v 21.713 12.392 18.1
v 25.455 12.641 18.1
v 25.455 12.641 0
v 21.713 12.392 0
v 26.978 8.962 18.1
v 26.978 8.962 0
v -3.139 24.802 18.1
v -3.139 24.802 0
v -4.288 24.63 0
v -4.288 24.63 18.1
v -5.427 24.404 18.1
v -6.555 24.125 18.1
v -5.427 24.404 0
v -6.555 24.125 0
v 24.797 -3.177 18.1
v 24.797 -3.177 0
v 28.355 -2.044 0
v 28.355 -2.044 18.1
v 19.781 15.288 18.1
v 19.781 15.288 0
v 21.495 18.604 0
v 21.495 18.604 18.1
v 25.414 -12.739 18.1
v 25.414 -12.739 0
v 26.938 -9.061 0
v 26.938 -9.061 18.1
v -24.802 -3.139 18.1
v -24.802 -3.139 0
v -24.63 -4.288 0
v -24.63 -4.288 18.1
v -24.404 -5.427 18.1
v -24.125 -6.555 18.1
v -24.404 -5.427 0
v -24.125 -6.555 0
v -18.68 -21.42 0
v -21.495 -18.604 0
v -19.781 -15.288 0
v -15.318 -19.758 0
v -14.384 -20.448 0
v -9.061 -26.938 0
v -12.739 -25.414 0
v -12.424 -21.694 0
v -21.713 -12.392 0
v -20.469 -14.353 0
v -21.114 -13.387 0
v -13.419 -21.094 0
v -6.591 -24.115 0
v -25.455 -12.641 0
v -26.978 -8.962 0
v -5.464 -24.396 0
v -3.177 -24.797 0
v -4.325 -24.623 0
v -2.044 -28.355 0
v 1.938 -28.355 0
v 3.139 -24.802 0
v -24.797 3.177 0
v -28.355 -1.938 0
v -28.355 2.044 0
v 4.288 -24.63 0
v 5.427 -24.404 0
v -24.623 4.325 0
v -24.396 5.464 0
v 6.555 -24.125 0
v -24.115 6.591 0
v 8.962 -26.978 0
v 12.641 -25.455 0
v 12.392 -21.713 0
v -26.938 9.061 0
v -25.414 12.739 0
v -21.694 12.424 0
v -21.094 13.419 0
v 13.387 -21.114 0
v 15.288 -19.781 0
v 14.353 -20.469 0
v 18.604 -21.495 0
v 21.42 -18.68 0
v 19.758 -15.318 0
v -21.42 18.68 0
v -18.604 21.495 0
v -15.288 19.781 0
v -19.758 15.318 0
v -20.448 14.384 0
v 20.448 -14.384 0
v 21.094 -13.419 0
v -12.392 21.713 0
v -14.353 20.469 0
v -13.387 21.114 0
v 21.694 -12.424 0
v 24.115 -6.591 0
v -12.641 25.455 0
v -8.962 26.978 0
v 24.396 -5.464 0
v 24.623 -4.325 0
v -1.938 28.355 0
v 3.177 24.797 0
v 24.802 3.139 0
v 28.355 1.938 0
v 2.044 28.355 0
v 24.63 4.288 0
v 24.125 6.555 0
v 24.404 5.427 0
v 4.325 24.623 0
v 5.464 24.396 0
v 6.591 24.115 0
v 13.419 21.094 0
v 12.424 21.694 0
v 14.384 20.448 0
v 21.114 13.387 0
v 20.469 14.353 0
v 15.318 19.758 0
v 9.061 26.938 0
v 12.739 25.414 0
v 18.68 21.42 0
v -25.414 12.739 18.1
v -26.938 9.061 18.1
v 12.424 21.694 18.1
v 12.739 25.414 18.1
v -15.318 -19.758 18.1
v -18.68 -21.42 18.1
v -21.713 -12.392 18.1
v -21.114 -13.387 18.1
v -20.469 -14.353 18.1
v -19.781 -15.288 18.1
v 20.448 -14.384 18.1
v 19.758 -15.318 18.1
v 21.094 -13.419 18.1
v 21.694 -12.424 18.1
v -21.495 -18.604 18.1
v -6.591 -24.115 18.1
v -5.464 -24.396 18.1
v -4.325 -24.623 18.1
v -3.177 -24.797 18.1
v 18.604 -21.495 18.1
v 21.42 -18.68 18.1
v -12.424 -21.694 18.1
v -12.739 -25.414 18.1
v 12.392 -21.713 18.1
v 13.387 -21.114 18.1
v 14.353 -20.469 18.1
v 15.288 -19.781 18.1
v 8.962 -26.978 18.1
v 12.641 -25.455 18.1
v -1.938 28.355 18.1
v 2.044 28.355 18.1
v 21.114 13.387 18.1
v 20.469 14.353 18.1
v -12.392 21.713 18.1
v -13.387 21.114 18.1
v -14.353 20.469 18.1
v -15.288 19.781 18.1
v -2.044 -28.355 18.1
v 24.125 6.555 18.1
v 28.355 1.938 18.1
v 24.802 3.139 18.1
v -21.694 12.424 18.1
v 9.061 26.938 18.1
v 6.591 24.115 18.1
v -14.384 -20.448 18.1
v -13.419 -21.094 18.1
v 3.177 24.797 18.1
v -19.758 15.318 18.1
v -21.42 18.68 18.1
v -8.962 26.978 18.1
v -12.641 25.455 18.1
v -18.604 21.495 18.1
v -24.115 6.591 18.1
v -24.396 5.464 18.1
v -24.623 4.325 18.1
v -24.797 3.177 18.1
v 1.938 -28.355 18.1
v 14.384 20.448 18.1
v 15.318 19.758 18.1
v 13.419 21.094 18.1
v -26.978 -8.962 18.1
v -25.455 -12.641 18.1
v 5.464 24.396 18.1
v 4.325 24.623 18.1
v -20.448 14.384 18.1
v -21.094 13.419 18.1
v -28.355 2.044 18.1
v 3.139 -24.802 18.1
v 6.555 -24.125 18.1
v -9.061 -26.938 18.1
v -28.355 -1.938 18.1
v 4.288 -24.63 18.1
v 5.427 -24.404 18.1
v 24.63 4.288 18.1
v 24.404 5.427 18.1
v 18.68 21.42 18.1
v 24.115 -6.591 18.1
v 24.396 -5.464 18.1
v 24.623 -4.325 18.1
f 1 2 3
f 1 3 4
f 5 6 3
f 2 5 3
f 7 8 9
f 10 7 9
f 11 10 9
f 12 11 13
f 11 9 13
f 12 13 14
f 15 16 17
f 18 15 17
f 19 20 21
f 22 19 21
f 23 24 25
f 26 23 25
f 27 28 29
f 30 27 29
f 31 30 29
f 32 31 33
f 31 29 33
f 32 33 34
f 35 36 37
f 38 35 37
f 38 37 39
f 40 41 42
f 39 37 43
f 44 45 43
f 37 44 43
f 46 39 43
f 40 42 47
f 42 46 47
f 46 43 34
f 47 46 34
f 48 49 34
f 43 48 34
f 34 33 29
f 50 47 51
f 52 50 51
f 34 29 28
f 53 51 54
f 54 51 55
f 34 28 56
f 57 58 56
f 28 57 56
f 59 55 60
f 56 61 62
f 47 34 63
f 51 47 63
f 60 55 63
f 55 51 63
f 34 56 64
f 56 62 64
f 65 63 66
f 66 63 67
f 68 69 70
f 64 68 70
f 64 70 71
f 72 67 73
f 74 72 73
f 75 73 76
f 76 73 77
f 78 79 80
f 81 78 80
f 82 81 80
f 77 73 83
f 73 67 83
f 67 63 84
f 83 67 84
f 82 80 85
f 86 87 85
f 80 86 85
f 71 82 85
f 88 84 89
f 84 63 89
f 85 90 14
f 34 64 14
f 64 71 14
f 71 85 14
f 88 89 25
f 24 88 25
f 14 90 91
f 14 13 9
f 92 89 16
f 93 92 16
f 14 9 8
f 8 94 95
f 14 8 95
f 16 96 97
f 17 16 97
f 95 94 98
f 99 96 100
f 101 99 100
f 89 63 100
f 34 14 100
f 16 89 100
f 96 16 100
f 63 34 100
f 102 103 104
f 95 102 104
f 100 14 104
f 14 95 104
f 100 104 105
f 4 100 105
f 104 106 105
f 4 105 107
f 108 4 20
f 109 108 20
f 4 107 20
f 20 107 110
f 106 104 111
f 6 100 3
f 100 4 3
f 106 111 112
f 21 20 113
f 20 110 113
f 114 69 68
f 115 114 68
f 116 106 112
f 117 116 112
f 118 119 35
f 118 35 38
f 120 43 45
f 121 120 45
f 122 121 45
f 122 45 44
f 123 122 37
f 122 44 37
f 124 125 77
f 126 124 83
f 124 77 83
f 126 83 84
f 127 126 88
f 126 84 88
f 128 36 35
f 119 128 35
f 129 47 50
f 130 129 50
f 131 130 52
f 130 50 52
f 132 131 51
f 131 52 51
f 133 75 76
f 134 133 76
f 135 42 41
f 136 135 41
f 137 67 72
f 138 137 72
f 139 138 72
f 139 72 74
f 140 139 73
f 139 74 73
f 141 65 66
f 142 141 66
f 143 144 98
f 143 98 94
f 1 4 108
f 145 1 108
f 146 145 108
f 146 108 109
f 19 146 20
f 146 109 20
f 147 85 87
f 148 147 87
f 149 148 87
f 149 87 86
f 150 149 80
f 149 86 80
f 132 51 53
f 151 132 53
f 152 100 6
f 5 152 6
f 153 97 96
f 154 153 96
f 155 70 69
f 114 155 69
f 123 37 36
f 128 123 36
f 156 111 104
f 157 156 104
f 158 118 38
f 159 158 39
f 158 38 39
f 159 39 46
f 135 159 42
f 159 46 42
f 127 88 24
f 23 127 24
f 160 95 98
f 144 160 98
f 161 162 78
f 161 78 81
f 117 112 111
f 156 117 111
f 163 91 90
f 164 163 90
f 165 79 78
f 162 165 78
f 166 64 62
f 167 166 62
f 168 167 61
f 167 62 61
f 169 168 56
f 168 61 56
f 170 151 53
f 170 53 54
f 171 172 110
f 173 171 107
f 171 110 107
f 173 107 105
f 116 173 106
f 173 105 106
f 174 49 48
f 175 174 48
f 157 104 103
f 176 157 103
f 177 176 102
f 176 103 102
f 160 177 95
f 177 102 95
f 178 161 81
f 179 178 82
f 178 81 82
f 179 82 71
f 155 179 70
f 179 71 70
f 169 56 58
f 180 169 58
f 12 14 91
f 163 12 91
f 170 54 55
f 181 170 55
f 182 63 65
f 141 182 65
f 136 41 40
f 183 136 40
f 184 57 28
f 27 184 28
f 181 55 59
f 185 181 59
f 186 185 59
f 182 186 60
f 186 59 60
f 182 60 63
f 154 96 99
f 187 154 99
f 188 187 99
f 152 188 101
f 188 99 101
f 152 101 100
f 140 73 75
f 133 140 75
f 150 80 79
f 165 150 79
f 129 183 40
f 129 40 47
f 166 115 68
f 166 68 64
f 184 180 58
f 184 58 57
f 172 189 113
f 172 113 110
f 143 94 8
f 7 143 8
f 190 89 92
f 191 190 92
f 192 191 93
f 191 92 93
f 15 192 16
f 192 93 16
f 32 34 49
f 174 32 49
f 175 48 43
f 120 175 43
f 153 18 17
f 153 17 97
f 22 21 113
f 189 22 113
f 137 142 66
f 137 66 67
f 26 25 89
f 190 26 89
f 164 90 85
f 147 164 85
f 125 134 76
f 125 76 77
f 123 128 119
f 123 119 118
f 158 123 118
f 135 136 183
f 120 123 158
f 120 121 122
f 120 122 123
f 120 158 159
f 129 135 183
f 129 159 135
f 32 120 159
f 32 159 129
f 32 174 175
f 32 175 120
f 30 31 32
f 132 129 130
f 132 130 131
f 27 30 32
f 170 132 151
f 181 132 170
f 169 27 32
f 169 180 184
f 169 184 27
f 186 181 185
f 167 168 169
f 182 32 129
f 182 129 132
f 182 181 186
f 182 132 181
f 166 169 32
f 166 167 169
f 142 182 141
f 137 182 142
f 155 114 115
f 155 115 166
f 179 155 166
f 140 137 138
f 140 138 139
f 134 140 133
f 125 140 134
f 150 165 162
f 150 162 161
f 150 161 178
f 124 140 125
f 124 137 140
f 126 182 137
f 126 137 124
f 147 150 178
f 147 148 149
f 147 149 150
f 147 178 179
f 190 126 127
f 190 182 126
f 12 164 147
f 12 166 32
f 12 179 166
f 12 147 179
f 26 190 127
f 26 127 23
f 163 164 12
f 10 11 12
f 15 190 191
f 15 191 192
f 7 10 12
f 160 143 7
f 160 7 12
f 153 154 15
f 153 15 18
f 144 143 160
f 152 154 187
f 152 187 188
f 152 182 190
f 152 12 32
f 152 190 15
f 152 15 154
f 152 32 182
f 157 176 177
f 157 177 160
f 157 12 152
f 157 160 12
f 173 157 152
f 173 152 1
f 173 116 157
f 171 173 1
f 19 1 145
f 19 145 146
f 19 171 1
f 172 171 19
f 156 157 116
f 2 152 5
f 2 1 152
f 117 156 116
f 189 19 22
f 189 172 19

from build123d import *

# Parameters (mm, degrees)
F1_DEPTH = 18.1


with BuildPart() as f1:
    # F0 (on Top) → F1 (new body)
    with BuildSketch(Plane.XY):
        with BuildLine():
            ThreePointArc((24.797365, -3.176582), (24.94929, -1.591519), (25, 0))
            ThreePointArc((25, 0), (24.950482, 1.57272), (24.802124, 3.13921))
            ThreePointArc((24.802124, 3.13921), (24.5233, 4.858782), (24.125403, 6.554762))
            ThreePointArc((24.125403, 6.554762), (23.10419, 9.54968), (21.712851, 12.391614))
            ThreePointArc((21.712851, 12.391614), (20.7972, 13.87359), (19.780568, 15.288203))
            ThreePointArc((19.780568, 15.288203), (17.690984, 17.664345), (15.317994, 19.757507))
            ThreePointArc((15.317994, 19.757507), (13.904914, 20.776269), (12.42432, 21.694153))
            ThreePointArc((12.42432, 21.694153), (9.584486, 23.089773), (6.59111, 24.115498))
            ThreePointArc((6.59111, 24.115498), (4.895732, 24.51595), (3.176582, 24.797365))
            ThreePointArc((3.176582, 24.797365), (0.018837, 24.999993), (-3.13921, 24.802124))
            ThreePointArc((-3.13921, 24.802124), (-4.858782, 24.5233), (-6.554762, 24.125403))
            ThreePointArc((-6.554762, 24.125403), (-9.54968, 23.10419), (-12.391614, 21.712851))
            ThreePointArc((-12.391614, 21.712851), (-13.87359, 20.7972), (-15.288203, 19.780568))
            ThreePointArc((-15.288203, 19.780568), (-17.664345, 17.690984), (-19.757507, 15.317994))
            ThreePointArc((-19.757507, 15.317994), (-20.776269, 13.904914), (-21.694153, 12.42432))
            ThreePointArc((-21.694153, 12.42432), (-23.089773, 9.584486), (-24.115498, 6.59111))
            ThreePointArc((-24.115498, 6.59111), (-24.51595, 4.895732), (-24.797365, 3.176582))
            ThreePointArc((-24.797365, 3.176582), (-24.999993, 0.018837), (-24.802124, -3.13921))
            ThreePointArc((-24.802124, -3.13921), (-24.5233, -4.858782), (-24.125403, -6.554762))
            ThreePointArc((-24.125403, -6.554762), (-23.10419, -9.54968), (-21.712851, -12.391614))
            ThreePointArc((-21.712851, -12.391614), (-20.7972, -13.87359), (-19.780568, -15.288203))
            ThreePointArc((-19.780568, -15.288203), (-17.690984, -17.664345), (-15.317994, -19.757507))
            ThreePointArc((-15.317994, -19.757507), (-13.904914, -20.776269), (-12.42432, -21.694153))
            ThreePointArc((-12.42432, -21.694153), (-9.584486, -23.089773), (-6.59111, -24.115498))
            ThreePointArc((-6.59111, -24.115498), (-4.895732, -24.51595), (-3.176582, -24.797365))
            ThreePointArc((-3.176582, -24.797365), (-0.018837, -24.999993), (3.13921, -24.802124))
            ThreePointArc((3.13921, -24.802124), (4.858782, -24.5233), (6.554762, -24.125403))
            ThreePointArc((6.554762, -24.125403), (9.54968, -23.10419), (12.391614, -21.712851))
            ThreePointArc((12.391614, -21.712851), (13.87359, -20.7972), (15.288203, -19.780568))
            ThreePointArc((15.288203, -19.780568), (17.664345, -17.690984), (19.757507, -15.317994))
            ThreePointArc((19.757507, -15.317994), (20.776269, -13.904914), (21.694153, -12.42432))
            ThreePointArc((21.694153, -12.42432), (23.089773, -9.584486), (24.115498, -6.59111))
            ThreePointArc((24.115498, -6.59111), (24.51595, -4.895732), (24.797365, -3.176582))
        make_face()
        with BuildLine():
            ThreePointArc((24.802124, 3.13921), (24.950482, 1.57272), (25, 0))
            ThreePointArc((25, 0), (24.94929, -1.591519), (24.797365, -3.176582))
            Line((24.797365, -3.176582), (28.354543, -2.044125))
            Line((28.354543, -2.044125), (28.354543, 1.937519))
            Line((28.354543, 1.937519), (24.802124, 3.13921))
        make_face()
        with BuildLine():
            ThreePointArc((21.712851, 12.391614), (23.10419, 9.54968), (24.125403, 6.554762))
            Line((24.125403, 6.554762), (26.978435, 8.962289))
            Line((26.978435, 8.962289), (25.454726, 12.640848))
            Line((25.454726, 12.640848), (21.712851, 12.391614))
        make_face()
        with BuildLine():
            Line((26.937638, -9.06078), (24.115498, -6.59111))
            ThreePointArc((24.115498, -6.59111), (23.089773, -9.584486), (21.694153, -12.42432))
            Line((21.694153, -12.42432), (25.413929, -12.739339))
            Line((25.413929, -12.739339), (26.937638, -9.06078))
        make_face()
        with BuildLine():
            ThreePointArc((15.317994, 19.757507), (17.690984, 17.664345), (19.780568, 15.288203))
            Line((19.780568, 15.288203), (21.495104, 18.604275))
            Line((21.495104, 18.604275), (18.679657, 21.419722))
            Line((18.679657, 21.419722), (15.317994, 19.757507))
        make_face()
        with BuildLine():
            Line((21.419722, -18.679657), (19.757507, -15.317994))
            ThreePointArc((19.757507, -15.317994), (17.664345, -17.690984), (15.288203, -19.780568))
            Line((15.288203, -19.780568), (18.604275, -21.495104))
            Line((18.604275, -21.495104), (21.419722, -18.679657))
        make_face()
        with BuildLine():
            ThreePointArc((6.59111, 24.115498), (9.584486, 23.089773), (12.42432, 21.694153))
            Line((12.42432, 21.694153), (12.739339, 25.413929))
            Line((12.739339, 25.413929), (9.06078, 26.937638))
            Line((9.06078, 26.937638), (6.59111, 24.115498))
        make_face()
        with BuildLine():
            Line((12.640848, -25.454726), (12.391614, -21.712851))
            ThreePointArc((12.391614, -21.712851), (9.54968, -23.10419), (6.554762, -24.125403))
            Line((6.554762, -24.125403), (8.962289, -26.978435))
            Line((8.962289, -26.978435), (12.640848, -25.454726))
        make_face()
        with BuildLine():
            ThreePointArc((-3.13921, 24.802124), (0.018837, 24.999993), (3.176582, 24.797365))
            Line((3.176582, 24.797365), (2.044125, 28.354543))
            Line((2.044125, 28.354543), (-1.937519, 28.354543))
            Line((-1.937519, 28.354543), (-3.13921, 24.802124))
        make_face()
        with BuildLine():
            Line((1.937519, -28.354543), (3.13921, -24.802124))
            ThreePointArc((3.13921, -24.802124), (-0.018837, -24.999993), (-3.176582, -24.797365))
            Line((-3.176582, -24.797365), (-2.044125, -28.354543))
            Line((-2.044125, -28.354543), (1.937519, -28.354543))
        make_face()
        with BuildLine():
            ThreePointArc((-12.391614, 21.712851), (-9.54968, 23.10419), (-6.554762, 24.125403))
            Line((-6.554762, 24.125403), (-8.962289, 26.978435))
            Line((-8.962289, 26.978435), (-12.640848, 25.454726))
            Line((-12.640848, 25.454726), (-12.391614, 21.712851))
        make_face()
        with BuildLine():
            Line((-9.06078, -26.937638), (-6.59111, -24.115498))
            ThreePointArc((-6.59111, -24.115498), (-9.584486, -23.089773), (-12.42432, -21.694153))
            Line((-12.42432, -21.694153), (-12.739339, -25.413929))
            Line((-12.739339, -25.413929), (-9.06078, -26.937638))
        make_face()
        with BuildLine():
            ThreePointArc((-19.757507, 15.317994), (-17.664345, 17.690984), (-15.288203, 19.780568))
            Line((-15.288203, 19.780568), (-18.604275, 21.495104))
            Line((-18.604275, 21.495104), (-21.419722, 18.679657))
            Line((-21.419722, 18.679657), (-19.757507, 15.317994))
        make_face()
        with BuildLine():
            Line((-18.679657, -21.419722), (-15.317994, -19.757507))
            ThreePointArc((-15.317994, -19.757507), (-17.690984, -17.664345), (-19.780568, -15.288203))
            Line((-19.780568, -15.288203), (-21.495104, -18.604275))
            Line((-21.495104, -18.604275), (-18.679657, -21.419722))
        make_face()
        with BuildLine():
            ThreePointArc((-24.115498, 6.59111), (-23.089773, 9.584486), (-21.694153, 12.42432))
            Line((-21.694153, 12.42432), (-25.413929, 12.739339))
            Line((-25.413929, 12.739339), (-26.937638, 9.06078))
            Line((-26.937638, 9.06078), (-24.115498, 6.59111))
        make_face()
        with BuildLine():
            Line((-25.454726, -12.640848), (-21.712851, -12.391614))
            ThreePointArc((-21.712851, -12.391614), (-23.10419, -9.54968), (-24.125403, -6.554762))
            Line((-24.125403, -6.554762), (-26.978435, -8.962289))
            Line((-26.978435, -8.962289), (-25.454726, -12.640848))
        make_face()
        with BuildLine():
            ThreePointArc((-24.802124, -3.13921), (-24.999993, 0.018837), (-24.797365, 3.176582))
            Line((-24.797365, 3.176582), (-28.354543, 2.044125))
            Line((-28.354543, 2.044125), (-28.354543, -1.937519))
            Line((-28.354543, -1.937519), (-24.802124, -3.13921))
        make_face()
    extrude(amount=F1_DEPTH)


solid = f1.part
